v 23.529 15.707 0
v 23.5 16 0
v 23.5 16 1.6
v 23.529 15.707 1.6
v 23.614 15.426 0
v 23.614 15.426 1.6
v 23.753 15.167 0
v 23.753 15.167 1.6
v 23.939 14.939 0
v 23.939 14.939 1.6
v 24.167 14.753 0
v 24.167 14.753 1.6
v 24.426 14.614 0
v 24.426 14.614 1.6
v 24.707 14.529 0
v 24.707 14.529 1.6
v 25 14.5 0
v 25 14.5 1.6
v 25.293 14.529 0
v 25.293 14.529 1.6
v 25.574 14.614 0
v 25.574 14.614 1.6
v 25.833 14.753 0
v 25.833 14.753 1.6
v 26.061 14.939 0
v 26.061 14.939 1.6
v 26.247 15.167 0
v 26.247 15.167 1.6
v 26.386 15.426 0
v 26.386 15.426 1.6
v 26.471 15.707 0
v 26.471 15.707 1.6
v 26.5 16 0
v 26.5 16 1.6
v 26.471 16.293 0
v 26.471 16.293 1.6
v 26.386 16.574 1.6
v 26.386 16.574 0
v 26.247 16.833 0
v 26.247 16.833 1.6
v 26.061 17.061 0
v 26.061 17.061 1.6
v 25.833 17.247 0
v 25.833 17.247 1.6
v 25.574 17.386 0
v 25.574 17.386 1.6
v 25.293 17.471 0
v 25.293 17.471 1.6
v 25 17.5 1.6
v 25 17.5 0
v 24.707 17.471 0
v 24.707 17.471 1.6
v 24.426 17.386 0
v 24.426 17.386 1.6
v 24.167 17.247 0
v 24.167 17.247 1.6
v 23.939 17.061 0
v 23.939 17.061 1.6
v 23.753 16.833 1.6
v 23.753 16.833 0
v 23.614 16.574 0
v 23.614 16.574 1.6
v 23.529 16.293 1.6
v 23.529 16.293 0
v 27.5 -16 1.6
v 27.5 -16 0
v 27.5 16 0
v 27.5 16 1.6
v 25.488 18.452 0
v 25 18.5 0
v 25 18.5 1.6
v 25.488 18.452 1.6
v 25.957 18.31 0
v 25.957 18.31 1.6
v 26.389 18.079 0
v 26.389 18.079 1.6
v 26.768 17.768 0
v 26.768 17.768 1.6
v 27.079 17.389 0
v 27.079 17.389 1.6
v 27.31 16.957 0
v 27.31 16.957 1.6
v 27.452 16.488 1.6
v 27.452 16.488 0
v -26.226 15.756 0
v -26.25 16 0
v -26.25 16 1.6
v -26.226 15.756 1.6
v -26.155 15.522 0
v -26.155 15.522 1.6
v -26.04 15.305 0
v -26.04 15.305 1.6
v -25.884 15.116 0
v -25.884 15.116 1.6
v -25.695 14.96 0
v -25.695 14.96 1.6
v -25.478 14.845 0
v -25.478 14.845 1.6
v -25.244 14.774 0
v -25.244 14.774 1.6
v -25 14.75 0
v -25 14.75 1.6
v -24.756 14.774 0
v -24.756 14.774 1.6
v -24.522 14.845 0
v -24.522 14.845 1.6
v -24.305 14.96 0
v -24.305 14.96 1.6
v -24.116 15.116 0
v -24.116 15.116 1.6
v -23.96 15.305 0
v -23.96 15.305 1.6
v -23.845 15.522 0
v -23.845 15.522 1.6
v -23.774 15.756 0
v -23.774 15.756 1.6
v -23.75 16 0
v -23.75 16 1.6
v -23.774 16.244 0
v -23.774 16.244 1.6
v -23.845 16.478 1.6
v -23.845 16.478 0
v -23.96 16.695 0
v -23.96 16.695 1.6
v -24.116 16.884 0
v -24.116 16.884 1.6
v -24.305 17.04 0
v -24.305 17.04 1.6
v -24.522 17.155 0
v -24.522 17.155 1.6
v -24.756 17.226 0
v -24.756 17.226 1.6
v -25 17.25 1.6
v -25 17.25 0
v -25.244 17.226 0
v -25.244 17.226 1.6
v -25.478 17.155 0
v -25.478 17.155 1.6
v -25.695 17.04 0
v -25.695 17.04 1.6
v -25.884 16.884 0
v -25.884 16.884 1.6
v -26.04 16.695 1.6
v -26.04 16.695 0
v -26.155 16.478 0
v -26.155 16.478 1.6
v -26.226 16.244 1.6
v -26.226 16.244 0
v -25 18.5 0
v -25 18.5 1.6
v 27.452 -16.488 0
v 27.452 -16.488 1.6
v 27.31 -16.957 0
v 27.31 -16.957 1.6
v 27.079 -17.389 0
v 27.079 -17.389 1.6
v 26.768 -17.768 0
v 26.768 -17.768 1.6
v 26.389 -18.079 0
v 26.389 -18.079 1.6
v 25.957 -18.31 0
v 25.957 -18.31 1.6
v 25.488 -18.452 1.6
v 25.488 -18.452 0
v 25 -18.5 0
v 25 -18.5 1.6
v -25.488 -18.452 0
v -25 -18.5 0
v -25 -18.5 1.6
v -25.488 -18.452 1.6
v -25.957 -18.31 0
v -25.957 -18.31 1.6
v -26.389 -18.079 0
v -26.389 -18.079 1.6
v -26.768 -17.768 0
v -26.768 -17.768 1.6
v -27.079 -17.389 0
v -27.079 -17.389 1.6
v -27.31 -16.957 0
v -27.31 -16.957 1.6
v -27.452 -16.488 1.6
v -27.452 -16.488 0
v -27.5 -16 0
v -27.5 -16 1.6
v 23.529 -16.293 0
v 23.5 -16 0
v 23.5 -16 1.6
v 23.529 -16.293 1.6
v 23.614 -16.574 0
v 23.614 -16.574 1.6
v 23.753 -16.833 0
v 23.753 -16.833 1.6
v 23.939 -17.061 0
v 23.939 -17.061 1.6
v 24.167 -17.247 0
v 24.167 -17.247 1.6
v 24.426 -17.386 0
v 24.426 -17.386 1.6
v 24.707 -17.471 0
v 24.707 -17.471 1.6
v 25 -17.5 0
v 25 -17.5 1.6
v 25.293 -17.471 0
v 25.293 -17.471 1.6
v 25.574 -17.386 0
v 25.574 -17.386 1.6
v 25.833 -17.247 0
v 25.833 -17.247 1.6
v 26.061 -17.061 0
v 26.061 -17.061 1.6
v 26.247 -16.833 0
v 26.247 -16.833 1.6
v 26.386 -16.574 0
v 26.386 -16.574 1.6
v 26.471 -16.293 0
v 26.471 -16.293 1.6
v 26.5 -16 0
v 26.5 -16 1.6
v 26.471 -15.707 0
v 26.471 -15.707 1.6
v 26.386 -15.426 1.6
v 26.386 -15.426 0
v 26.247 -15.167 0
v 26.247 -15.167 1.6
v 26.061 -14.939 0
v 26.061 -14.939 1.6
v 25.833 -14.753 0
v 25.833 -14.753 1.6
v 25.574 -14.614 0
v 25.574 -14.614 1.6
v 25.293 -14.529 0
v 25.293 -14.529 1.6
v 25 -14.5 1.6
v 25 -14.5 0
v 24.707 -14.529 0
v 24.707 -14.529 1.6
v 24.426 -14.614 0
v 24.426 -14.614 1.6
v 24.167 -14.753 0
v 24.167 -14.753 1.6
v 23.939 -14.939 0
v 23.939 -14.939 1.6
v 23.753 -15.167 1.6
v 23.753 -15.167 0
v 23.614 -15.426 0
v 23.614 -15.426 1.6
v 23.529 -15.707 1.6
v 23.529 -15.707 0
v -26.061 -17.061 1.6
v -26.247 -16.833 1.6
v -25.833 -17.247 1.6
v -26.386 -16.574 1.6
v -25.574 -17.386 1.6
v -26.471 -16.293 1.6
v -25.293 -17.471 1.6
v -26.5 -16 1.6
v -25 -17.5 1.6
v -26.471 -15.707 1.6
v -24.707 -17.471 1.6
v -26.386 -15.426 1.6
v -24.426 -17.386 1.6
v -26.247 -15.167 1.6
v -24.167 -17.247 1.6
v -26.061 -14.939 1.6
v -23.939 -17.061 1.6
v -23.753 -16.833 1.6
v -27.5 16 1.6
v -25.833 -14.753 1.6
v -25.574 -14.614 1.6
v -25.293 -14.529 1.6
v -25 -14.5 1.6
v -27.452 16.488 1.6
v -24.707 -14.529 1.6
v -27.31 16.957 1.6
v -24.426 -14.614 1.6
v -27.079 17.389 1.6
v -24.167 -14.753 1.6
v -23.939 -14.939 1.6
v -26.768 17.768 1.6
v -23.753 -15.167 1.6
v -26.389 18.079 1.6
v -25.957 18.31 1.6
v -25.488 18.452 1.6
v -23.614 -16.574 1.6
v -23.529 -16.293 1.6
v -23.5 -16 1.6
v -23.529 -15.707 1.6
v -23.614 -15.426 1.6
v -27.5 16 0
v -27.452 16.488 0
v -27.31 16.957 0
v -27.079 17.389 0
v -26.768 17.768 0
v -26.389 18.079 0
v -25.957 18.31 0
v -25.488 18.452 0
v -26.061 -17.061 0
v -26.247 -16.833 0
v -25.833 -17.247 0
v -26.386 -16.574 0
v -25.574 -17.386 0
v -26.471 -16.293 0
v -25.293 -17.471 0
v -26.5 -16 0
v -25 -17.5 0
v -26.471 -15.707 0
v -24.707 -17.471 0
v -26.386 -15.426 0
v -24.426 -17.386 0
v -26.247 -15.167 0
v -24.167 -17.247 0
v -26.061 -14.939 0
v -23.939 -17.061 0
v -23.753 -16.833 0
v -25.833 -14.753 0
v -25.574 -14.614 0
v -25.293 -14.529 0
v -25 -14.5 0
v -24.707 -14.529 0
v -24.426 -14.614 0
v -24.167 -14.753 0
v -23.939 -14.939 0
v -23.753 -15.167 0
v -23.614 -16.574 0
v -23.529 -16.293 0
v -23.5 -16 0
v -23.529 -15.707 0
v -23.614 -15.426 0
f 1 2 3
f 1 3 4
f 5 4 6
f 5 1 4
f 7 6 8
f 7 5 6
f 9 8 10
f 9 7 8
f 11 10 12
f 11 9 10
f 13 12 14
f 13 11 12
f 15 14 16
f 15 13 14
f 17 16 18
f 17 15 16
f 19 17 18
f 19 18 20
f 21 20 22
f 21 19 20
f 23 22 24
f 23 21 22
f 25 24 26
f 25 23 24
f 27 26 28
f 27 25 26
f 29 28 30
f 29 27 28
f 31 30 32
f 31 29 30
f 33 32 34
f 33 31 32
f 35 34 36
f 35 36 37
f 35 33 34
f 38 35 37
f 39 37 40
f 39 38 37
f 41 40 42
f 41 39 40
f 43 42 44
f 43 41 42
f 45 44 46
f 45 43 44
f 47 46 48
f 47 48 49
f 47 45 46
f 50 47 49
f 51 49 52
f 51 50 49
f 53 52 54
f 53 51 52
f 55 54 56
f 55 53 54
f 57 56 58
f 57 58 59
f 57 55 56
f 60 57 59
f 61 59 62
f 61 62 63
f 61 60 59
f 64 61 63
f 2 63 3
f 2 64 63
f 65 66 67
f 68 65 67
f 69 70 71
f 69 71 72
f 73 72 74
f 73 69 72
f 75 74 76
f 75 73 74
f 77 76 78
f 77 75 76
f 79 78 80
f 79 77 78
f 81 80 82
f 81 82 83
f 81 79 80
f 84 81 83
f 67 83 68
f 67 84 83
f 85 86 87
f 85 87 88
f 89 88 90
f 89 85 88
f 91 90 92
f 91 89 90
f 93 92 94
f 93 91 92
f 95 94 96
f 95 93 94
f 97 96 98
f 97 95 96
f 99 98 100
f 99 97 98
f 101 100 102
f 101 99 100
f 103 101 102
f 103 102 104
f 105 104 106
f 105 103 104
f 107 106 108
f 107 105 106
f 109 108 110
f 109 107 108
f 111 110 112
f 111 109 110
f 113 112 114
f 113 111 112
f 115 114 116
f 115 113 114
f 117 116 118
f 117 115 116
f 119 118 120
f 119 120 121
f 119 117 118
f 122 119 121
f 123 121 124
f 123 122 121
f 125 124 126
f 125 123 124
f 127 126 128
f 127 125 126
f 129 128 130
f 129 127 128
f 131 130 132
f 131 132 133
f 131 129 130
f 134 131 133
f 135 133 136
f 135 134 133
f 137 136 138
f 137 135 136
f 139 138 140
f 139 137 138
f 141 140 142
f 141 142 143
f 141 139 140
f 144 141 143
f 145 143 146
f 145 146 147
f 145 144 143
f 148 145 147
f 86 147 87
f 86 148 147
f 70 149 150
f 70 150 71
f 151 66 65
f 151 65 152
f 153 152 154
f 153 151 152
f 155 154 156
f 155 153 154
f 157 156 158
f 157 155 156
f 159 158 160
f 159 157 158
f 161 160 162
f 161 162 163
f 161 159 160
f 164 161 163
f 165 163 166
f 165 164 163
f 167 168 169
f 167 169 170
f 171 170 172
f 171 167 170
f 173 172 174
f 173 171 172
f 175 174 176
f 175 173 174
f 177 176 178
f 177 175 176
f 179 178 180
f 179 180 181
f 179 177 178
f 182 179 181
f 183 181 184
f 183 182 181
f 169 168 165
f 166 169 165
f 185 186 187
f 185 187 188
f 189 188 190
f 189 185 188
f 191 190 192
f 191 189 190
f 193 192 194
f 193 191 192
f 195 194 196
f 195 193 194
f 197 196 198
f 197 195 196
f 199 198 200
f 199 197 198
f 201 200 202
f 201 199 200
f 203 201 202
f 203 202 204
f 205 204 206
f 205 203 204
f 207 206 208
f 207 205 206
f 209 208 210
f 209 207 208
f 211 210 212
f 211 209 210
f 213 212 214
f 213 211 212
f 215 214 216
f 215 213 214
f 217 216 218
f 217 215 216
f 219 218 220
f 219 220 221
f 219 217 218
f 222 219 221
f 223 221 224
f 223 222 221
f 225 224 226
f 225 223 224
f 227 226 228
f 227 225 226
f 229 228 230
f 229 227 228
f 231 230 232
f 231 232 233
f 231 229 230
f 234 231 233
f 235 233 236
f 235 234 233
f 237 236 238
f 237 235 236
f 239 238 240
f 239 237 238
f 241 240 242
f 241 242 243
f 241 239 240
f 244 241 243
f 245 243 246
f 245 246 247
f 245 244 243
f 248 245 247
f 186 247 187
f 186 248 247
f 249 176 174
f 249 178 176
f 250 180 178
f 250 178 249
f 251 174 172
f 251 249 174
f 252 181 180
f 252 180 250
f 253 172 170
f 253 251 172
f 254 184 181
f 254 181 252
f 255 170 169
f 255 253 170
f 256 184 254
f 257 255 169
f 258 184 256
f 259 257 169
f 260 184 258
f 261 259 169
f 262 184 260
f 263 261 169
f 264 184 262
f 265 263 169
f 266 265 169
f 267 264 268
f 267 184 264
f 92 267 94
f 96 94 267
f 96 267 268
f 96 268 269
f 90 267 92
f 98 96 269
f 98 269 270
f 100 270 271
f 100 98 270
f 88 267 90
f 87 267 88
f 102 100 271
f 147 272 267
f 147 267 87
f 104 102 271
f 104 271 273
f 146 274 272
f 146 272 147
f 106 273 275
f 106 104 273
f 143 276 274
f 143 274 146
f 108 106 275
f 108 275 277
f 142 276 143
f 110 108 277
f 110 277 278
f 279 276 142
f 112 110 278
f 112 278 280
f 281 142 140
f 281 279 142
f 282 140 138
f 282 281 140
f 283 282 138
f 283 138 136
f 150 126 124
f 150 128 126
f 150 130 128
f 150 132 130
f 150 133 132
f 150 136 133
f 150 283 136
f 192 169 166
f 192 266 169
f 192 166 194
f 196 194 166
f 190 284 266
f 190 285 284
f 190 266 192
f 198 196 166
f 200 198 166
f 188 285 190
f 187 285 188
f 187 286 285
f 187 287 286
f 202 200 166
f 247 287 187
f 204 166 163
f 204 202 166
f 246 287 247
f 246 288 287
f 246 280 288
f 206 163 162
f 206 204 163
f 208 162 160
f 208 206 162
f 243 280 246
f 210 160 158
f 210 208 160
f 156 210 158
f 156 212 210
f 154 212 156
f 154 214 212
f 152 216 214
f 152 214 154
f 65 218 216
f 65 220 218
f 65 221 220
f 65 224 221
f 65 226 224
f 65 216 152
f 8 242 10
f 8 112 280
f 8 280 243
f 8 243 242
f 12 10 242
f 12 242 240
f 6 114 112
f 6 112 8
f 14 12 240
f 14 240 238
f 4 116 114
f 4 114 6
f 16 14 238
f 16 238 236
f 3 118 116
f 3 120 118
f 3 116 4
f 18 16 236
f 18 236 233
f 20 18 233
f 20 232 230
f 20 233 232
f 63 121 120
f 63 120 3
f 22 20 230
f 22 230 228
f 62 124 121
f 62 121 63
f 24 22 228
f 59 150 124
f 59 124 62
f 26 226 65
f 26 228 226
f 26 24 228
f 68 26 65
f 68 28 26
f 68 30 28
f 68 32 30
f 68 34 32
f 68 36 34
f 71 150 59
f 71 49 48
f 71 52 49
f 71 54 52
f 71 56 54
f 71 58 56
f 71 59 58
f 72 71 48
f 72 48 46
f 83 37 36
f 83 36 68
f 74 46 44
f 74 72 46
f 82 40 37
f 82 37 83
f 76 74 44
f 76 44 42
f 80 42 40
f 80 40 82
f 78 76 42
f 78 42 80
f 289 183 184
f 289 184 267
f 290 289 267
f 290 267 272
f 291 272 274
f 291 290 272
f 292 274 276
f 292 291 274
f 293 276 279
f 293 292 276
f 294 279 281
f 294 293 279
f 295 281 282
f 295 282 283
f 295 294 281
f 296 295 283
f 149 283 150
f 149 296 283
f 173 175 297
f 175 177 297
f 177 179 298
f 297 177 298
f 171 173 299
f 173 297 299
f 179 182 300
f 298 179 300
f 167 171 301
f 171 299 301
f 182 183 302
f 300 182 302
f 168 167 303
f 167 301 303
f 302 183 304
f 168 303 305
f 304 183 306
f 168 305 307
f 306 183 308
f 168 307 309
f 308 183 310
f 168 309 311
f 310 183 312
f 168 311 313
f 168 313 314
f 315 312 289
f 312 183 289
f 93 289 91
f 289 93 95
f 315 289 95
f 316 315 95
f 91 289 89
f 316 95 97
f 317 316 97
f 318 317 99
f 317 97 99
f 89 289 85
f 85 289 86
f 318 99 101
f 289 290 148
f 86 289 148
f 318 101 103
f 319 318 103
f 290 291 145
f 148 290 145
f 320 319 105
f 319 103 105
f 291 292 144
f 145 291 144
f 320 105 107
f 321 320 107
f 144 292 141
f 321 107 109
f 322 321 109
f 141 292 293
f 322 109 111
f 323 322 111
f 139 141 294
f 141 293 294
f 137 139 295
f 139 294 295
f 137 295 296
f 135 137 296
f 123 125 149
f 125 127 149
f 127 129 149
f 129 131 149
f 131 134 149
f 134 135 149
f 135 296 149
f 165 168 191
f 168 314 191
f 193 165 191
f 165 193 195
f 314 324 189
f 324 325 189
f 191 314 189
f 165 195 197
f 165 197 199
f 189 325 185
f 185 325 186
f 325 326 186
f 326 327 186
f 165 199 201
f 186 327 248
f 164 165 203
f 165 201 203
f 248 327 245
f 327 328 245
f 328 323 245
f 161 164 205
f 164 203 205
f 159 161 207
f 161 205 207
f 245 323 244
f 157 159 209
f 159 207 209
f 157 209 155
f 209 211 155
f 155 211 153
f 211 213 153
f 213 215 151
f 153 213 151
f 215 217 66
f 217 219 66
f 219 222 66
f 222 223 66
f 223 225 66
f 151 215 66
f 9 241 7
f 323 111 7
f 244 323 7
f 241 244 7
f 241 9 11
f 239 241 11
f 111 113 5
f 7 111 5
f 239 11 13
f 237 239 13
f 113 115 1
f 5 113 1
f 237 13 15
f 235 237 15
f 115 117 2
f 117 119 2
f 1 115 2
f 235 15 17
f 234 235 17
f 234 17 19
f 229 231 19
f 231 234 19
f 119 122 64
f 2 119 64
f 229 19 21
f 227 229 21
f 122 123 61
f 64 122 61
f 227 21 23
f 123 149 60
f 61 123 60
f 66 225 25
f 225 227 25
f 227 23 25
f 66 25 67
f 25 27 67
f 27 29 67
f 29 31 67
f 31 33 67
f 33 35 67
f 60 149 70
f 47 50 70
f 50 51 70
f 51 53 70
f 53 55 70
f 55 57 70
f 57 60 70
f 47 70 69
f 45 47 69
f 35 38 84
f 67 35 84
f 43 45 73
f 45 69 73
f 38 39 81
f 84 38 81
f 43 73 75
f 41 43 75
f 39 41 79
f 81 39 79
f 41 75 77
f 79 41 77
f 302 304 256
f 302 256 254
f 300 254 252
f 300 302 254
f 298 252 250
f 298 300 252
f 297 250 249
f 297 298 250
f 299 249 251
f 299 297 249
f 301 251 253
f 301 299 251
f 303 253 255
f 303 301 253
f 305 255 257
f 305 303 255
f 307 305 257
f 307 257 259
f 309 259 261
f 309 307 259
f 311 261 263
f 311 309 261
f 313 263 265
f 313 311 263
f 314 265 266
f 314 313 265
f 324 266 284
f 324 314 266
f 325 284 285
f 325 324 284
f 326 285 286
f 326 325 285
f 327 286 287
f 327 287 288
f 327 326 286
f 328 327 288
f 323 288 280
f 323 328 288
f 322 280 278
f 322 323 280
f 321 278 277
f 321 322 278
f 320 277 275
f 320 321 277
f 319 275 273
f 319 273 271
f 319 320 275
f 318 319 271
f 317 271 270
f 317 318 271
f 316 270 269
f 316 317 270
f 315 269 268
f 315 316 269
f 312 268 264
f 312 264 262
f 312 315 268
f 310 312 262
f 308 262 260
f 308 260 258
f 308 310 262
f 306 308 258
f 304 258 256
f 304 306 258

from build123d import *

# Parameters (mm, degrees)
SKETCH_1_W          = 55
SKETCH_1_H          = 37
EXTRUDE_1_DEPTH     = 1.6
CUT_EXTRUDE_1_DEPTH = 1.6
SKETCH_5_R          = 1.250363817
SKETCH_5_R_2        = 1.5
CUT_EXTRUDE_2_DEPTH = 1.6


with BuildPart() as part:
    # 草图1 → 凸台-拉伸1 (new body)
    with BuildSketch(Plane.XY):
        Rectangle(SKETCH_1_W, SKETCH_1_H)
    extrude(amount=EXTRUDE_1_DEPTH)

    # 草图3 → 切除-拉伸1 (cut)
    with BuildSketch(Plane.XY):
        with BuildLine():
            Line((-25, 18.5), (-27.5, 18.5))
            Line((-27.5, 18.5), (-27.5, 16))
            ThreePointArc((-27.5, 16), (-26.767766953, 17.767766953), (-25, 18.5))
        make_face()
        with BuildLine():
            Line((27.5, 16), (27.5, 18.5))
            Line((27.5, 18.5), (25, 18.5))
            ThreePointArc((25, 18.5), (26.767766953, 17.767766953), (27.5, 16))
        make_face()
        with BuildLine():
            Line((27.5, -18.5), (27.5, -16))
            ThreePointArc((27.5, -16), (26.767766953, -17.767766953), (25, -18.5))
            Line((25, -18.5), (27.5, -18.5))
        make_face()
        with BuildLine():
            Line((-27.5, -18.5), (-25, -18.5))
            ThreePointArc((-25, -18.5), (-26.767766953, -17.767766953), (-27.5, -16))
            Line((-27.5, -16), (-27.5, -18.5))
        make_face()
    extrude(amount=CUT_EXTRUDE_1_DEPTH, mode=Mode.SUBTRACT)

    # 草图5 → 切除-拉伸2 (cut)
    with BuildSketch(Plane.XY):
        with Locations(Location((-25, 16, 0), (0, 0, 180))):
            Circle(SKETCH_5_R)
        with Locations(Location((-25, -16, 0), (0, 0, 180))):
            Circle(SKETCH_5_R_2)
        with Locations(Location((25, 16, 0), (0, 0, 180))):
            Circle(SKETCH_5_R_2)
        with Locations(Location((25, -16, 0), (0, 0, 180))):
            Circle(SKETCH_5_R_2)
    extrude(amount=CUT_EXTRUDE_2_DEPTH, mode=Mode.SUBTRACT)


solid = part.part
